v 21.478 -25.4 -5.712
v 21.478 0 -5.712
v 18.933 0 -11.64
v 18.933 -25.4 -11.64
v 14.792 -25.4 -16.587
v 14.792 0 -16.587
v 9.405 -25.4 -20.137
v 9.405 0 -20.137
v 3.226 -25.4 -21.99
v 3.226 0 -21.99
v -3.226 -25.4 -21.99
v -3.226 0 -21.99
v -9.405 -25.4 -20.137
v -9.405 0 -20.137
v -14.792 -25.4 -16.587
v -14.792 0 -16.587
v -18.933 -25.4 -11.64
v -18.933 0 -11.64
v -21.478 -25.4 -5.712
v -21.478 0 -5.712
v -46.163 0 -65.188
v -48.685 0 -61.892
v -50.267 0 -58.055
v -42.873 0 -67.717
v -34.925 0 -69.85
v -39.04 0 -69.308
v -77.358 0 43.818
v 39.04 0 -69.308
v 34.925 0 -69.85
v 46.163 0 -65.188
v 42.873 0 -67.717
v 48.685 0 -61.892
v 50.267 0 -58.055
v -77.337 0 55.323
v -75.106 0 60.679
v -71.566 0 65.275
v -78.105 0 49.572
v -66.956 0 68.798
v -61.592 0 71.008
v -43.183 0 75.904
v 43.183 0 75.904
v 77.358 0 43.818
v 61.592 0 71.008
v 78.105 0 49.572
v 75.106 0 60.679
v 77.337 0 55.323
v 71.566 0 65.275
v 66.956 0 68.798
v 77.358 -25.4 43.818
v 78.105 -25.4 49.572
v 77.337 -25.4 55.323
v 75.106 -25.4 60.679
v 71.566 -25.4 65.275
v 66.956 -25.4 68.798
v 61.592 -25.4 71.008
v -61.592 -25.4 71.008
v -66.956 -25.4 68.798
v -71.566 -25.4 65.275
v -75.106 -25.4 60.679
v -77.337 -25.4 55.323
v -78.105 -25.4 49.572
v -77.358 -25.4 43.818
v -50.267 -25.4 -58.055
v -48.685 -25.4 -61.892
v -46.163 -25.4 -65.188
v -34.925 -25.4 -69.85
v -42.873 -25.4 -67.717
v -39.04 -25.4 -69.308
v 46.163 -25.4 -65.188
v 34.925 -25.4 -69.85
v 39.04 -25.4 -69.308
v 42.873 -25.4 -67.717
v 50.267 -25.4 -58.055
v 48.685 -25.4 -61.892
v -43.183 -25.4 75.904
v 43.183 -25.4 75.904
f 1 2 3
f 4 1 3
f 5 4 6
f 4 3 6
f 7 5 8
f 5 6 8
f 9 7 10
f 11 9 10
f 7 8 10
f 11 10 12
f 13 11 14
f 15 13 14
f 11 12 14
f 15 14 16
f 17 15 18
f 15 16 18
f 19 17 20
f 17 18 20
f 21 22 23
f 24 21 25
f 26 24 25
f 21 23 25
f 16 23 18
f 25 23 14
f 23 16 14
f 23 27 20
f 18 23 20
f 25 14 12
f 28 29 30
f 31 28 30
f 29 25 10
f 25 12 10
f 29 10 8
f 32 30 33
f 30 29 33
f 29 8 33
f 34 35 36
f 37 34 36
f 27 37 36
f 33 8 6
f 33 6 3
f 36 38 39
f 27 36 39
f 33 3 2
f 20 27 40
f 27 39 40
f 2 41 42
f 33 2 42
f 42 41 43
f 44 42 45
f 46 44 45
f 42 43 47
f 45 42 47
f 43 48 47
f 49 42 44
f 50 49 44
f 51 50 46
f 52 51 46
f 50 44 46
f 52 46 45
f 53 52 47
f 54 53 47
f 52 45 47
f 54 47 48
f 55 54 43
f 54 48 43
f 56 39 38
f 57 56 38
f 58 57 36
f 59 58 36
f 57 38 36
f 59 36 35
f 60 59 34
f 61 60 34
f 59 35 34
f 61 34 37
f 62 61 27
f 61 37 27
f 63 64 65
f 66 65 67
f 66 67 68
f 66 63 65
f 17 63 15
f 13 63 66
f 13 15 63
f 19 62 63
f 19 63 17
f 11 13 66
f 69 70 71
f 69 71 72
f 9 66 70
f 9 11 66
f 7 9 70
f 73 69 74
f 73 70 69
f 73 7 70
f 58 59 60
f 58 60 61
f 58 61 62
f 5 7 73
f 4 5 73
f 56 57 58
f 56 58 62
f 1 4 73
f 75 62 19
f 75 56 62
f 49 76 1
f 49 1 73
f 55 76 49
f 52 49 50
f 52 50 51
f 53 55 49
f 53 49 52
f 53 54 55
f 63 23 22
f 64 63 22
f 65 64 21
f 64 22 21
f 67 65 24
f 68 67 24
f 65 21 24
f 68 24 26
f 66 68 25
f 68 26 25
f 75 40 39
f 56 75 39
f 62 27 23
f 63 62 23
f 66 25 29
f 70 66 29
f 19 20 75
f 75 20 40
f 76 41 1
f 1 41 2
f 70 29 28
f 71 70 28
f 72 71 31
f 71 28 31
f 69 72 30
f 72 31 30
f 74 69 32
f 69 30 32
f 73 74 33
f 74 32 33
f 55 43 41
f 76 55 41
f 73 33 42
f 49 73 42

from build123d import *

# Parameters (mm, degrees)
F1_DEPTH = 25.4


with BuildPart() as f1:
    # F0 (on Front) → F1 (new body)
    with BuildSketch(Plane.XZ):
        with BuildLine():
            ThreePointArc((-50.266767, -58.054928), (-44.600918, -66.560398), (-34.925, -69.85))
            Line((-34.925, -69.85), (34.925, -69.85))
            ThreePointArc((34.925, -69.85), (44.600918, -66.560398), (50.266767, -58.054928))
            Line((50.266767, -58.054928), (77.358474, 43.8181))
            ThreePointArc((77.358474, 43.8181), (75.106497, 60.678651), (61.5919, 71.008474))
            Line((61.5919, 71.008474), (43.183091, 75.904039))
            Line((43.183091, 75.904039), (21.478474, -5.7119))
            ThreePointArc((21.478474, -5.7119), (0, -22.225), (-21.478474, -5.7119))
            Line((-21.478474, -5.7119), (-43.183091, 75.904039))
            Line((-43.183091, 75.904039), (-61.5919, 71.008474))
            ThreePointArc((-61.5919, 71.008474), (-75.106497, 60.678651), (-77.358474, 43.8181))
            Line((-77.358474, 43.8181), (-50.266767, -58.054928))
        make_face()
    extrude(amount=F1_DEPTH)


solid = f1.part
